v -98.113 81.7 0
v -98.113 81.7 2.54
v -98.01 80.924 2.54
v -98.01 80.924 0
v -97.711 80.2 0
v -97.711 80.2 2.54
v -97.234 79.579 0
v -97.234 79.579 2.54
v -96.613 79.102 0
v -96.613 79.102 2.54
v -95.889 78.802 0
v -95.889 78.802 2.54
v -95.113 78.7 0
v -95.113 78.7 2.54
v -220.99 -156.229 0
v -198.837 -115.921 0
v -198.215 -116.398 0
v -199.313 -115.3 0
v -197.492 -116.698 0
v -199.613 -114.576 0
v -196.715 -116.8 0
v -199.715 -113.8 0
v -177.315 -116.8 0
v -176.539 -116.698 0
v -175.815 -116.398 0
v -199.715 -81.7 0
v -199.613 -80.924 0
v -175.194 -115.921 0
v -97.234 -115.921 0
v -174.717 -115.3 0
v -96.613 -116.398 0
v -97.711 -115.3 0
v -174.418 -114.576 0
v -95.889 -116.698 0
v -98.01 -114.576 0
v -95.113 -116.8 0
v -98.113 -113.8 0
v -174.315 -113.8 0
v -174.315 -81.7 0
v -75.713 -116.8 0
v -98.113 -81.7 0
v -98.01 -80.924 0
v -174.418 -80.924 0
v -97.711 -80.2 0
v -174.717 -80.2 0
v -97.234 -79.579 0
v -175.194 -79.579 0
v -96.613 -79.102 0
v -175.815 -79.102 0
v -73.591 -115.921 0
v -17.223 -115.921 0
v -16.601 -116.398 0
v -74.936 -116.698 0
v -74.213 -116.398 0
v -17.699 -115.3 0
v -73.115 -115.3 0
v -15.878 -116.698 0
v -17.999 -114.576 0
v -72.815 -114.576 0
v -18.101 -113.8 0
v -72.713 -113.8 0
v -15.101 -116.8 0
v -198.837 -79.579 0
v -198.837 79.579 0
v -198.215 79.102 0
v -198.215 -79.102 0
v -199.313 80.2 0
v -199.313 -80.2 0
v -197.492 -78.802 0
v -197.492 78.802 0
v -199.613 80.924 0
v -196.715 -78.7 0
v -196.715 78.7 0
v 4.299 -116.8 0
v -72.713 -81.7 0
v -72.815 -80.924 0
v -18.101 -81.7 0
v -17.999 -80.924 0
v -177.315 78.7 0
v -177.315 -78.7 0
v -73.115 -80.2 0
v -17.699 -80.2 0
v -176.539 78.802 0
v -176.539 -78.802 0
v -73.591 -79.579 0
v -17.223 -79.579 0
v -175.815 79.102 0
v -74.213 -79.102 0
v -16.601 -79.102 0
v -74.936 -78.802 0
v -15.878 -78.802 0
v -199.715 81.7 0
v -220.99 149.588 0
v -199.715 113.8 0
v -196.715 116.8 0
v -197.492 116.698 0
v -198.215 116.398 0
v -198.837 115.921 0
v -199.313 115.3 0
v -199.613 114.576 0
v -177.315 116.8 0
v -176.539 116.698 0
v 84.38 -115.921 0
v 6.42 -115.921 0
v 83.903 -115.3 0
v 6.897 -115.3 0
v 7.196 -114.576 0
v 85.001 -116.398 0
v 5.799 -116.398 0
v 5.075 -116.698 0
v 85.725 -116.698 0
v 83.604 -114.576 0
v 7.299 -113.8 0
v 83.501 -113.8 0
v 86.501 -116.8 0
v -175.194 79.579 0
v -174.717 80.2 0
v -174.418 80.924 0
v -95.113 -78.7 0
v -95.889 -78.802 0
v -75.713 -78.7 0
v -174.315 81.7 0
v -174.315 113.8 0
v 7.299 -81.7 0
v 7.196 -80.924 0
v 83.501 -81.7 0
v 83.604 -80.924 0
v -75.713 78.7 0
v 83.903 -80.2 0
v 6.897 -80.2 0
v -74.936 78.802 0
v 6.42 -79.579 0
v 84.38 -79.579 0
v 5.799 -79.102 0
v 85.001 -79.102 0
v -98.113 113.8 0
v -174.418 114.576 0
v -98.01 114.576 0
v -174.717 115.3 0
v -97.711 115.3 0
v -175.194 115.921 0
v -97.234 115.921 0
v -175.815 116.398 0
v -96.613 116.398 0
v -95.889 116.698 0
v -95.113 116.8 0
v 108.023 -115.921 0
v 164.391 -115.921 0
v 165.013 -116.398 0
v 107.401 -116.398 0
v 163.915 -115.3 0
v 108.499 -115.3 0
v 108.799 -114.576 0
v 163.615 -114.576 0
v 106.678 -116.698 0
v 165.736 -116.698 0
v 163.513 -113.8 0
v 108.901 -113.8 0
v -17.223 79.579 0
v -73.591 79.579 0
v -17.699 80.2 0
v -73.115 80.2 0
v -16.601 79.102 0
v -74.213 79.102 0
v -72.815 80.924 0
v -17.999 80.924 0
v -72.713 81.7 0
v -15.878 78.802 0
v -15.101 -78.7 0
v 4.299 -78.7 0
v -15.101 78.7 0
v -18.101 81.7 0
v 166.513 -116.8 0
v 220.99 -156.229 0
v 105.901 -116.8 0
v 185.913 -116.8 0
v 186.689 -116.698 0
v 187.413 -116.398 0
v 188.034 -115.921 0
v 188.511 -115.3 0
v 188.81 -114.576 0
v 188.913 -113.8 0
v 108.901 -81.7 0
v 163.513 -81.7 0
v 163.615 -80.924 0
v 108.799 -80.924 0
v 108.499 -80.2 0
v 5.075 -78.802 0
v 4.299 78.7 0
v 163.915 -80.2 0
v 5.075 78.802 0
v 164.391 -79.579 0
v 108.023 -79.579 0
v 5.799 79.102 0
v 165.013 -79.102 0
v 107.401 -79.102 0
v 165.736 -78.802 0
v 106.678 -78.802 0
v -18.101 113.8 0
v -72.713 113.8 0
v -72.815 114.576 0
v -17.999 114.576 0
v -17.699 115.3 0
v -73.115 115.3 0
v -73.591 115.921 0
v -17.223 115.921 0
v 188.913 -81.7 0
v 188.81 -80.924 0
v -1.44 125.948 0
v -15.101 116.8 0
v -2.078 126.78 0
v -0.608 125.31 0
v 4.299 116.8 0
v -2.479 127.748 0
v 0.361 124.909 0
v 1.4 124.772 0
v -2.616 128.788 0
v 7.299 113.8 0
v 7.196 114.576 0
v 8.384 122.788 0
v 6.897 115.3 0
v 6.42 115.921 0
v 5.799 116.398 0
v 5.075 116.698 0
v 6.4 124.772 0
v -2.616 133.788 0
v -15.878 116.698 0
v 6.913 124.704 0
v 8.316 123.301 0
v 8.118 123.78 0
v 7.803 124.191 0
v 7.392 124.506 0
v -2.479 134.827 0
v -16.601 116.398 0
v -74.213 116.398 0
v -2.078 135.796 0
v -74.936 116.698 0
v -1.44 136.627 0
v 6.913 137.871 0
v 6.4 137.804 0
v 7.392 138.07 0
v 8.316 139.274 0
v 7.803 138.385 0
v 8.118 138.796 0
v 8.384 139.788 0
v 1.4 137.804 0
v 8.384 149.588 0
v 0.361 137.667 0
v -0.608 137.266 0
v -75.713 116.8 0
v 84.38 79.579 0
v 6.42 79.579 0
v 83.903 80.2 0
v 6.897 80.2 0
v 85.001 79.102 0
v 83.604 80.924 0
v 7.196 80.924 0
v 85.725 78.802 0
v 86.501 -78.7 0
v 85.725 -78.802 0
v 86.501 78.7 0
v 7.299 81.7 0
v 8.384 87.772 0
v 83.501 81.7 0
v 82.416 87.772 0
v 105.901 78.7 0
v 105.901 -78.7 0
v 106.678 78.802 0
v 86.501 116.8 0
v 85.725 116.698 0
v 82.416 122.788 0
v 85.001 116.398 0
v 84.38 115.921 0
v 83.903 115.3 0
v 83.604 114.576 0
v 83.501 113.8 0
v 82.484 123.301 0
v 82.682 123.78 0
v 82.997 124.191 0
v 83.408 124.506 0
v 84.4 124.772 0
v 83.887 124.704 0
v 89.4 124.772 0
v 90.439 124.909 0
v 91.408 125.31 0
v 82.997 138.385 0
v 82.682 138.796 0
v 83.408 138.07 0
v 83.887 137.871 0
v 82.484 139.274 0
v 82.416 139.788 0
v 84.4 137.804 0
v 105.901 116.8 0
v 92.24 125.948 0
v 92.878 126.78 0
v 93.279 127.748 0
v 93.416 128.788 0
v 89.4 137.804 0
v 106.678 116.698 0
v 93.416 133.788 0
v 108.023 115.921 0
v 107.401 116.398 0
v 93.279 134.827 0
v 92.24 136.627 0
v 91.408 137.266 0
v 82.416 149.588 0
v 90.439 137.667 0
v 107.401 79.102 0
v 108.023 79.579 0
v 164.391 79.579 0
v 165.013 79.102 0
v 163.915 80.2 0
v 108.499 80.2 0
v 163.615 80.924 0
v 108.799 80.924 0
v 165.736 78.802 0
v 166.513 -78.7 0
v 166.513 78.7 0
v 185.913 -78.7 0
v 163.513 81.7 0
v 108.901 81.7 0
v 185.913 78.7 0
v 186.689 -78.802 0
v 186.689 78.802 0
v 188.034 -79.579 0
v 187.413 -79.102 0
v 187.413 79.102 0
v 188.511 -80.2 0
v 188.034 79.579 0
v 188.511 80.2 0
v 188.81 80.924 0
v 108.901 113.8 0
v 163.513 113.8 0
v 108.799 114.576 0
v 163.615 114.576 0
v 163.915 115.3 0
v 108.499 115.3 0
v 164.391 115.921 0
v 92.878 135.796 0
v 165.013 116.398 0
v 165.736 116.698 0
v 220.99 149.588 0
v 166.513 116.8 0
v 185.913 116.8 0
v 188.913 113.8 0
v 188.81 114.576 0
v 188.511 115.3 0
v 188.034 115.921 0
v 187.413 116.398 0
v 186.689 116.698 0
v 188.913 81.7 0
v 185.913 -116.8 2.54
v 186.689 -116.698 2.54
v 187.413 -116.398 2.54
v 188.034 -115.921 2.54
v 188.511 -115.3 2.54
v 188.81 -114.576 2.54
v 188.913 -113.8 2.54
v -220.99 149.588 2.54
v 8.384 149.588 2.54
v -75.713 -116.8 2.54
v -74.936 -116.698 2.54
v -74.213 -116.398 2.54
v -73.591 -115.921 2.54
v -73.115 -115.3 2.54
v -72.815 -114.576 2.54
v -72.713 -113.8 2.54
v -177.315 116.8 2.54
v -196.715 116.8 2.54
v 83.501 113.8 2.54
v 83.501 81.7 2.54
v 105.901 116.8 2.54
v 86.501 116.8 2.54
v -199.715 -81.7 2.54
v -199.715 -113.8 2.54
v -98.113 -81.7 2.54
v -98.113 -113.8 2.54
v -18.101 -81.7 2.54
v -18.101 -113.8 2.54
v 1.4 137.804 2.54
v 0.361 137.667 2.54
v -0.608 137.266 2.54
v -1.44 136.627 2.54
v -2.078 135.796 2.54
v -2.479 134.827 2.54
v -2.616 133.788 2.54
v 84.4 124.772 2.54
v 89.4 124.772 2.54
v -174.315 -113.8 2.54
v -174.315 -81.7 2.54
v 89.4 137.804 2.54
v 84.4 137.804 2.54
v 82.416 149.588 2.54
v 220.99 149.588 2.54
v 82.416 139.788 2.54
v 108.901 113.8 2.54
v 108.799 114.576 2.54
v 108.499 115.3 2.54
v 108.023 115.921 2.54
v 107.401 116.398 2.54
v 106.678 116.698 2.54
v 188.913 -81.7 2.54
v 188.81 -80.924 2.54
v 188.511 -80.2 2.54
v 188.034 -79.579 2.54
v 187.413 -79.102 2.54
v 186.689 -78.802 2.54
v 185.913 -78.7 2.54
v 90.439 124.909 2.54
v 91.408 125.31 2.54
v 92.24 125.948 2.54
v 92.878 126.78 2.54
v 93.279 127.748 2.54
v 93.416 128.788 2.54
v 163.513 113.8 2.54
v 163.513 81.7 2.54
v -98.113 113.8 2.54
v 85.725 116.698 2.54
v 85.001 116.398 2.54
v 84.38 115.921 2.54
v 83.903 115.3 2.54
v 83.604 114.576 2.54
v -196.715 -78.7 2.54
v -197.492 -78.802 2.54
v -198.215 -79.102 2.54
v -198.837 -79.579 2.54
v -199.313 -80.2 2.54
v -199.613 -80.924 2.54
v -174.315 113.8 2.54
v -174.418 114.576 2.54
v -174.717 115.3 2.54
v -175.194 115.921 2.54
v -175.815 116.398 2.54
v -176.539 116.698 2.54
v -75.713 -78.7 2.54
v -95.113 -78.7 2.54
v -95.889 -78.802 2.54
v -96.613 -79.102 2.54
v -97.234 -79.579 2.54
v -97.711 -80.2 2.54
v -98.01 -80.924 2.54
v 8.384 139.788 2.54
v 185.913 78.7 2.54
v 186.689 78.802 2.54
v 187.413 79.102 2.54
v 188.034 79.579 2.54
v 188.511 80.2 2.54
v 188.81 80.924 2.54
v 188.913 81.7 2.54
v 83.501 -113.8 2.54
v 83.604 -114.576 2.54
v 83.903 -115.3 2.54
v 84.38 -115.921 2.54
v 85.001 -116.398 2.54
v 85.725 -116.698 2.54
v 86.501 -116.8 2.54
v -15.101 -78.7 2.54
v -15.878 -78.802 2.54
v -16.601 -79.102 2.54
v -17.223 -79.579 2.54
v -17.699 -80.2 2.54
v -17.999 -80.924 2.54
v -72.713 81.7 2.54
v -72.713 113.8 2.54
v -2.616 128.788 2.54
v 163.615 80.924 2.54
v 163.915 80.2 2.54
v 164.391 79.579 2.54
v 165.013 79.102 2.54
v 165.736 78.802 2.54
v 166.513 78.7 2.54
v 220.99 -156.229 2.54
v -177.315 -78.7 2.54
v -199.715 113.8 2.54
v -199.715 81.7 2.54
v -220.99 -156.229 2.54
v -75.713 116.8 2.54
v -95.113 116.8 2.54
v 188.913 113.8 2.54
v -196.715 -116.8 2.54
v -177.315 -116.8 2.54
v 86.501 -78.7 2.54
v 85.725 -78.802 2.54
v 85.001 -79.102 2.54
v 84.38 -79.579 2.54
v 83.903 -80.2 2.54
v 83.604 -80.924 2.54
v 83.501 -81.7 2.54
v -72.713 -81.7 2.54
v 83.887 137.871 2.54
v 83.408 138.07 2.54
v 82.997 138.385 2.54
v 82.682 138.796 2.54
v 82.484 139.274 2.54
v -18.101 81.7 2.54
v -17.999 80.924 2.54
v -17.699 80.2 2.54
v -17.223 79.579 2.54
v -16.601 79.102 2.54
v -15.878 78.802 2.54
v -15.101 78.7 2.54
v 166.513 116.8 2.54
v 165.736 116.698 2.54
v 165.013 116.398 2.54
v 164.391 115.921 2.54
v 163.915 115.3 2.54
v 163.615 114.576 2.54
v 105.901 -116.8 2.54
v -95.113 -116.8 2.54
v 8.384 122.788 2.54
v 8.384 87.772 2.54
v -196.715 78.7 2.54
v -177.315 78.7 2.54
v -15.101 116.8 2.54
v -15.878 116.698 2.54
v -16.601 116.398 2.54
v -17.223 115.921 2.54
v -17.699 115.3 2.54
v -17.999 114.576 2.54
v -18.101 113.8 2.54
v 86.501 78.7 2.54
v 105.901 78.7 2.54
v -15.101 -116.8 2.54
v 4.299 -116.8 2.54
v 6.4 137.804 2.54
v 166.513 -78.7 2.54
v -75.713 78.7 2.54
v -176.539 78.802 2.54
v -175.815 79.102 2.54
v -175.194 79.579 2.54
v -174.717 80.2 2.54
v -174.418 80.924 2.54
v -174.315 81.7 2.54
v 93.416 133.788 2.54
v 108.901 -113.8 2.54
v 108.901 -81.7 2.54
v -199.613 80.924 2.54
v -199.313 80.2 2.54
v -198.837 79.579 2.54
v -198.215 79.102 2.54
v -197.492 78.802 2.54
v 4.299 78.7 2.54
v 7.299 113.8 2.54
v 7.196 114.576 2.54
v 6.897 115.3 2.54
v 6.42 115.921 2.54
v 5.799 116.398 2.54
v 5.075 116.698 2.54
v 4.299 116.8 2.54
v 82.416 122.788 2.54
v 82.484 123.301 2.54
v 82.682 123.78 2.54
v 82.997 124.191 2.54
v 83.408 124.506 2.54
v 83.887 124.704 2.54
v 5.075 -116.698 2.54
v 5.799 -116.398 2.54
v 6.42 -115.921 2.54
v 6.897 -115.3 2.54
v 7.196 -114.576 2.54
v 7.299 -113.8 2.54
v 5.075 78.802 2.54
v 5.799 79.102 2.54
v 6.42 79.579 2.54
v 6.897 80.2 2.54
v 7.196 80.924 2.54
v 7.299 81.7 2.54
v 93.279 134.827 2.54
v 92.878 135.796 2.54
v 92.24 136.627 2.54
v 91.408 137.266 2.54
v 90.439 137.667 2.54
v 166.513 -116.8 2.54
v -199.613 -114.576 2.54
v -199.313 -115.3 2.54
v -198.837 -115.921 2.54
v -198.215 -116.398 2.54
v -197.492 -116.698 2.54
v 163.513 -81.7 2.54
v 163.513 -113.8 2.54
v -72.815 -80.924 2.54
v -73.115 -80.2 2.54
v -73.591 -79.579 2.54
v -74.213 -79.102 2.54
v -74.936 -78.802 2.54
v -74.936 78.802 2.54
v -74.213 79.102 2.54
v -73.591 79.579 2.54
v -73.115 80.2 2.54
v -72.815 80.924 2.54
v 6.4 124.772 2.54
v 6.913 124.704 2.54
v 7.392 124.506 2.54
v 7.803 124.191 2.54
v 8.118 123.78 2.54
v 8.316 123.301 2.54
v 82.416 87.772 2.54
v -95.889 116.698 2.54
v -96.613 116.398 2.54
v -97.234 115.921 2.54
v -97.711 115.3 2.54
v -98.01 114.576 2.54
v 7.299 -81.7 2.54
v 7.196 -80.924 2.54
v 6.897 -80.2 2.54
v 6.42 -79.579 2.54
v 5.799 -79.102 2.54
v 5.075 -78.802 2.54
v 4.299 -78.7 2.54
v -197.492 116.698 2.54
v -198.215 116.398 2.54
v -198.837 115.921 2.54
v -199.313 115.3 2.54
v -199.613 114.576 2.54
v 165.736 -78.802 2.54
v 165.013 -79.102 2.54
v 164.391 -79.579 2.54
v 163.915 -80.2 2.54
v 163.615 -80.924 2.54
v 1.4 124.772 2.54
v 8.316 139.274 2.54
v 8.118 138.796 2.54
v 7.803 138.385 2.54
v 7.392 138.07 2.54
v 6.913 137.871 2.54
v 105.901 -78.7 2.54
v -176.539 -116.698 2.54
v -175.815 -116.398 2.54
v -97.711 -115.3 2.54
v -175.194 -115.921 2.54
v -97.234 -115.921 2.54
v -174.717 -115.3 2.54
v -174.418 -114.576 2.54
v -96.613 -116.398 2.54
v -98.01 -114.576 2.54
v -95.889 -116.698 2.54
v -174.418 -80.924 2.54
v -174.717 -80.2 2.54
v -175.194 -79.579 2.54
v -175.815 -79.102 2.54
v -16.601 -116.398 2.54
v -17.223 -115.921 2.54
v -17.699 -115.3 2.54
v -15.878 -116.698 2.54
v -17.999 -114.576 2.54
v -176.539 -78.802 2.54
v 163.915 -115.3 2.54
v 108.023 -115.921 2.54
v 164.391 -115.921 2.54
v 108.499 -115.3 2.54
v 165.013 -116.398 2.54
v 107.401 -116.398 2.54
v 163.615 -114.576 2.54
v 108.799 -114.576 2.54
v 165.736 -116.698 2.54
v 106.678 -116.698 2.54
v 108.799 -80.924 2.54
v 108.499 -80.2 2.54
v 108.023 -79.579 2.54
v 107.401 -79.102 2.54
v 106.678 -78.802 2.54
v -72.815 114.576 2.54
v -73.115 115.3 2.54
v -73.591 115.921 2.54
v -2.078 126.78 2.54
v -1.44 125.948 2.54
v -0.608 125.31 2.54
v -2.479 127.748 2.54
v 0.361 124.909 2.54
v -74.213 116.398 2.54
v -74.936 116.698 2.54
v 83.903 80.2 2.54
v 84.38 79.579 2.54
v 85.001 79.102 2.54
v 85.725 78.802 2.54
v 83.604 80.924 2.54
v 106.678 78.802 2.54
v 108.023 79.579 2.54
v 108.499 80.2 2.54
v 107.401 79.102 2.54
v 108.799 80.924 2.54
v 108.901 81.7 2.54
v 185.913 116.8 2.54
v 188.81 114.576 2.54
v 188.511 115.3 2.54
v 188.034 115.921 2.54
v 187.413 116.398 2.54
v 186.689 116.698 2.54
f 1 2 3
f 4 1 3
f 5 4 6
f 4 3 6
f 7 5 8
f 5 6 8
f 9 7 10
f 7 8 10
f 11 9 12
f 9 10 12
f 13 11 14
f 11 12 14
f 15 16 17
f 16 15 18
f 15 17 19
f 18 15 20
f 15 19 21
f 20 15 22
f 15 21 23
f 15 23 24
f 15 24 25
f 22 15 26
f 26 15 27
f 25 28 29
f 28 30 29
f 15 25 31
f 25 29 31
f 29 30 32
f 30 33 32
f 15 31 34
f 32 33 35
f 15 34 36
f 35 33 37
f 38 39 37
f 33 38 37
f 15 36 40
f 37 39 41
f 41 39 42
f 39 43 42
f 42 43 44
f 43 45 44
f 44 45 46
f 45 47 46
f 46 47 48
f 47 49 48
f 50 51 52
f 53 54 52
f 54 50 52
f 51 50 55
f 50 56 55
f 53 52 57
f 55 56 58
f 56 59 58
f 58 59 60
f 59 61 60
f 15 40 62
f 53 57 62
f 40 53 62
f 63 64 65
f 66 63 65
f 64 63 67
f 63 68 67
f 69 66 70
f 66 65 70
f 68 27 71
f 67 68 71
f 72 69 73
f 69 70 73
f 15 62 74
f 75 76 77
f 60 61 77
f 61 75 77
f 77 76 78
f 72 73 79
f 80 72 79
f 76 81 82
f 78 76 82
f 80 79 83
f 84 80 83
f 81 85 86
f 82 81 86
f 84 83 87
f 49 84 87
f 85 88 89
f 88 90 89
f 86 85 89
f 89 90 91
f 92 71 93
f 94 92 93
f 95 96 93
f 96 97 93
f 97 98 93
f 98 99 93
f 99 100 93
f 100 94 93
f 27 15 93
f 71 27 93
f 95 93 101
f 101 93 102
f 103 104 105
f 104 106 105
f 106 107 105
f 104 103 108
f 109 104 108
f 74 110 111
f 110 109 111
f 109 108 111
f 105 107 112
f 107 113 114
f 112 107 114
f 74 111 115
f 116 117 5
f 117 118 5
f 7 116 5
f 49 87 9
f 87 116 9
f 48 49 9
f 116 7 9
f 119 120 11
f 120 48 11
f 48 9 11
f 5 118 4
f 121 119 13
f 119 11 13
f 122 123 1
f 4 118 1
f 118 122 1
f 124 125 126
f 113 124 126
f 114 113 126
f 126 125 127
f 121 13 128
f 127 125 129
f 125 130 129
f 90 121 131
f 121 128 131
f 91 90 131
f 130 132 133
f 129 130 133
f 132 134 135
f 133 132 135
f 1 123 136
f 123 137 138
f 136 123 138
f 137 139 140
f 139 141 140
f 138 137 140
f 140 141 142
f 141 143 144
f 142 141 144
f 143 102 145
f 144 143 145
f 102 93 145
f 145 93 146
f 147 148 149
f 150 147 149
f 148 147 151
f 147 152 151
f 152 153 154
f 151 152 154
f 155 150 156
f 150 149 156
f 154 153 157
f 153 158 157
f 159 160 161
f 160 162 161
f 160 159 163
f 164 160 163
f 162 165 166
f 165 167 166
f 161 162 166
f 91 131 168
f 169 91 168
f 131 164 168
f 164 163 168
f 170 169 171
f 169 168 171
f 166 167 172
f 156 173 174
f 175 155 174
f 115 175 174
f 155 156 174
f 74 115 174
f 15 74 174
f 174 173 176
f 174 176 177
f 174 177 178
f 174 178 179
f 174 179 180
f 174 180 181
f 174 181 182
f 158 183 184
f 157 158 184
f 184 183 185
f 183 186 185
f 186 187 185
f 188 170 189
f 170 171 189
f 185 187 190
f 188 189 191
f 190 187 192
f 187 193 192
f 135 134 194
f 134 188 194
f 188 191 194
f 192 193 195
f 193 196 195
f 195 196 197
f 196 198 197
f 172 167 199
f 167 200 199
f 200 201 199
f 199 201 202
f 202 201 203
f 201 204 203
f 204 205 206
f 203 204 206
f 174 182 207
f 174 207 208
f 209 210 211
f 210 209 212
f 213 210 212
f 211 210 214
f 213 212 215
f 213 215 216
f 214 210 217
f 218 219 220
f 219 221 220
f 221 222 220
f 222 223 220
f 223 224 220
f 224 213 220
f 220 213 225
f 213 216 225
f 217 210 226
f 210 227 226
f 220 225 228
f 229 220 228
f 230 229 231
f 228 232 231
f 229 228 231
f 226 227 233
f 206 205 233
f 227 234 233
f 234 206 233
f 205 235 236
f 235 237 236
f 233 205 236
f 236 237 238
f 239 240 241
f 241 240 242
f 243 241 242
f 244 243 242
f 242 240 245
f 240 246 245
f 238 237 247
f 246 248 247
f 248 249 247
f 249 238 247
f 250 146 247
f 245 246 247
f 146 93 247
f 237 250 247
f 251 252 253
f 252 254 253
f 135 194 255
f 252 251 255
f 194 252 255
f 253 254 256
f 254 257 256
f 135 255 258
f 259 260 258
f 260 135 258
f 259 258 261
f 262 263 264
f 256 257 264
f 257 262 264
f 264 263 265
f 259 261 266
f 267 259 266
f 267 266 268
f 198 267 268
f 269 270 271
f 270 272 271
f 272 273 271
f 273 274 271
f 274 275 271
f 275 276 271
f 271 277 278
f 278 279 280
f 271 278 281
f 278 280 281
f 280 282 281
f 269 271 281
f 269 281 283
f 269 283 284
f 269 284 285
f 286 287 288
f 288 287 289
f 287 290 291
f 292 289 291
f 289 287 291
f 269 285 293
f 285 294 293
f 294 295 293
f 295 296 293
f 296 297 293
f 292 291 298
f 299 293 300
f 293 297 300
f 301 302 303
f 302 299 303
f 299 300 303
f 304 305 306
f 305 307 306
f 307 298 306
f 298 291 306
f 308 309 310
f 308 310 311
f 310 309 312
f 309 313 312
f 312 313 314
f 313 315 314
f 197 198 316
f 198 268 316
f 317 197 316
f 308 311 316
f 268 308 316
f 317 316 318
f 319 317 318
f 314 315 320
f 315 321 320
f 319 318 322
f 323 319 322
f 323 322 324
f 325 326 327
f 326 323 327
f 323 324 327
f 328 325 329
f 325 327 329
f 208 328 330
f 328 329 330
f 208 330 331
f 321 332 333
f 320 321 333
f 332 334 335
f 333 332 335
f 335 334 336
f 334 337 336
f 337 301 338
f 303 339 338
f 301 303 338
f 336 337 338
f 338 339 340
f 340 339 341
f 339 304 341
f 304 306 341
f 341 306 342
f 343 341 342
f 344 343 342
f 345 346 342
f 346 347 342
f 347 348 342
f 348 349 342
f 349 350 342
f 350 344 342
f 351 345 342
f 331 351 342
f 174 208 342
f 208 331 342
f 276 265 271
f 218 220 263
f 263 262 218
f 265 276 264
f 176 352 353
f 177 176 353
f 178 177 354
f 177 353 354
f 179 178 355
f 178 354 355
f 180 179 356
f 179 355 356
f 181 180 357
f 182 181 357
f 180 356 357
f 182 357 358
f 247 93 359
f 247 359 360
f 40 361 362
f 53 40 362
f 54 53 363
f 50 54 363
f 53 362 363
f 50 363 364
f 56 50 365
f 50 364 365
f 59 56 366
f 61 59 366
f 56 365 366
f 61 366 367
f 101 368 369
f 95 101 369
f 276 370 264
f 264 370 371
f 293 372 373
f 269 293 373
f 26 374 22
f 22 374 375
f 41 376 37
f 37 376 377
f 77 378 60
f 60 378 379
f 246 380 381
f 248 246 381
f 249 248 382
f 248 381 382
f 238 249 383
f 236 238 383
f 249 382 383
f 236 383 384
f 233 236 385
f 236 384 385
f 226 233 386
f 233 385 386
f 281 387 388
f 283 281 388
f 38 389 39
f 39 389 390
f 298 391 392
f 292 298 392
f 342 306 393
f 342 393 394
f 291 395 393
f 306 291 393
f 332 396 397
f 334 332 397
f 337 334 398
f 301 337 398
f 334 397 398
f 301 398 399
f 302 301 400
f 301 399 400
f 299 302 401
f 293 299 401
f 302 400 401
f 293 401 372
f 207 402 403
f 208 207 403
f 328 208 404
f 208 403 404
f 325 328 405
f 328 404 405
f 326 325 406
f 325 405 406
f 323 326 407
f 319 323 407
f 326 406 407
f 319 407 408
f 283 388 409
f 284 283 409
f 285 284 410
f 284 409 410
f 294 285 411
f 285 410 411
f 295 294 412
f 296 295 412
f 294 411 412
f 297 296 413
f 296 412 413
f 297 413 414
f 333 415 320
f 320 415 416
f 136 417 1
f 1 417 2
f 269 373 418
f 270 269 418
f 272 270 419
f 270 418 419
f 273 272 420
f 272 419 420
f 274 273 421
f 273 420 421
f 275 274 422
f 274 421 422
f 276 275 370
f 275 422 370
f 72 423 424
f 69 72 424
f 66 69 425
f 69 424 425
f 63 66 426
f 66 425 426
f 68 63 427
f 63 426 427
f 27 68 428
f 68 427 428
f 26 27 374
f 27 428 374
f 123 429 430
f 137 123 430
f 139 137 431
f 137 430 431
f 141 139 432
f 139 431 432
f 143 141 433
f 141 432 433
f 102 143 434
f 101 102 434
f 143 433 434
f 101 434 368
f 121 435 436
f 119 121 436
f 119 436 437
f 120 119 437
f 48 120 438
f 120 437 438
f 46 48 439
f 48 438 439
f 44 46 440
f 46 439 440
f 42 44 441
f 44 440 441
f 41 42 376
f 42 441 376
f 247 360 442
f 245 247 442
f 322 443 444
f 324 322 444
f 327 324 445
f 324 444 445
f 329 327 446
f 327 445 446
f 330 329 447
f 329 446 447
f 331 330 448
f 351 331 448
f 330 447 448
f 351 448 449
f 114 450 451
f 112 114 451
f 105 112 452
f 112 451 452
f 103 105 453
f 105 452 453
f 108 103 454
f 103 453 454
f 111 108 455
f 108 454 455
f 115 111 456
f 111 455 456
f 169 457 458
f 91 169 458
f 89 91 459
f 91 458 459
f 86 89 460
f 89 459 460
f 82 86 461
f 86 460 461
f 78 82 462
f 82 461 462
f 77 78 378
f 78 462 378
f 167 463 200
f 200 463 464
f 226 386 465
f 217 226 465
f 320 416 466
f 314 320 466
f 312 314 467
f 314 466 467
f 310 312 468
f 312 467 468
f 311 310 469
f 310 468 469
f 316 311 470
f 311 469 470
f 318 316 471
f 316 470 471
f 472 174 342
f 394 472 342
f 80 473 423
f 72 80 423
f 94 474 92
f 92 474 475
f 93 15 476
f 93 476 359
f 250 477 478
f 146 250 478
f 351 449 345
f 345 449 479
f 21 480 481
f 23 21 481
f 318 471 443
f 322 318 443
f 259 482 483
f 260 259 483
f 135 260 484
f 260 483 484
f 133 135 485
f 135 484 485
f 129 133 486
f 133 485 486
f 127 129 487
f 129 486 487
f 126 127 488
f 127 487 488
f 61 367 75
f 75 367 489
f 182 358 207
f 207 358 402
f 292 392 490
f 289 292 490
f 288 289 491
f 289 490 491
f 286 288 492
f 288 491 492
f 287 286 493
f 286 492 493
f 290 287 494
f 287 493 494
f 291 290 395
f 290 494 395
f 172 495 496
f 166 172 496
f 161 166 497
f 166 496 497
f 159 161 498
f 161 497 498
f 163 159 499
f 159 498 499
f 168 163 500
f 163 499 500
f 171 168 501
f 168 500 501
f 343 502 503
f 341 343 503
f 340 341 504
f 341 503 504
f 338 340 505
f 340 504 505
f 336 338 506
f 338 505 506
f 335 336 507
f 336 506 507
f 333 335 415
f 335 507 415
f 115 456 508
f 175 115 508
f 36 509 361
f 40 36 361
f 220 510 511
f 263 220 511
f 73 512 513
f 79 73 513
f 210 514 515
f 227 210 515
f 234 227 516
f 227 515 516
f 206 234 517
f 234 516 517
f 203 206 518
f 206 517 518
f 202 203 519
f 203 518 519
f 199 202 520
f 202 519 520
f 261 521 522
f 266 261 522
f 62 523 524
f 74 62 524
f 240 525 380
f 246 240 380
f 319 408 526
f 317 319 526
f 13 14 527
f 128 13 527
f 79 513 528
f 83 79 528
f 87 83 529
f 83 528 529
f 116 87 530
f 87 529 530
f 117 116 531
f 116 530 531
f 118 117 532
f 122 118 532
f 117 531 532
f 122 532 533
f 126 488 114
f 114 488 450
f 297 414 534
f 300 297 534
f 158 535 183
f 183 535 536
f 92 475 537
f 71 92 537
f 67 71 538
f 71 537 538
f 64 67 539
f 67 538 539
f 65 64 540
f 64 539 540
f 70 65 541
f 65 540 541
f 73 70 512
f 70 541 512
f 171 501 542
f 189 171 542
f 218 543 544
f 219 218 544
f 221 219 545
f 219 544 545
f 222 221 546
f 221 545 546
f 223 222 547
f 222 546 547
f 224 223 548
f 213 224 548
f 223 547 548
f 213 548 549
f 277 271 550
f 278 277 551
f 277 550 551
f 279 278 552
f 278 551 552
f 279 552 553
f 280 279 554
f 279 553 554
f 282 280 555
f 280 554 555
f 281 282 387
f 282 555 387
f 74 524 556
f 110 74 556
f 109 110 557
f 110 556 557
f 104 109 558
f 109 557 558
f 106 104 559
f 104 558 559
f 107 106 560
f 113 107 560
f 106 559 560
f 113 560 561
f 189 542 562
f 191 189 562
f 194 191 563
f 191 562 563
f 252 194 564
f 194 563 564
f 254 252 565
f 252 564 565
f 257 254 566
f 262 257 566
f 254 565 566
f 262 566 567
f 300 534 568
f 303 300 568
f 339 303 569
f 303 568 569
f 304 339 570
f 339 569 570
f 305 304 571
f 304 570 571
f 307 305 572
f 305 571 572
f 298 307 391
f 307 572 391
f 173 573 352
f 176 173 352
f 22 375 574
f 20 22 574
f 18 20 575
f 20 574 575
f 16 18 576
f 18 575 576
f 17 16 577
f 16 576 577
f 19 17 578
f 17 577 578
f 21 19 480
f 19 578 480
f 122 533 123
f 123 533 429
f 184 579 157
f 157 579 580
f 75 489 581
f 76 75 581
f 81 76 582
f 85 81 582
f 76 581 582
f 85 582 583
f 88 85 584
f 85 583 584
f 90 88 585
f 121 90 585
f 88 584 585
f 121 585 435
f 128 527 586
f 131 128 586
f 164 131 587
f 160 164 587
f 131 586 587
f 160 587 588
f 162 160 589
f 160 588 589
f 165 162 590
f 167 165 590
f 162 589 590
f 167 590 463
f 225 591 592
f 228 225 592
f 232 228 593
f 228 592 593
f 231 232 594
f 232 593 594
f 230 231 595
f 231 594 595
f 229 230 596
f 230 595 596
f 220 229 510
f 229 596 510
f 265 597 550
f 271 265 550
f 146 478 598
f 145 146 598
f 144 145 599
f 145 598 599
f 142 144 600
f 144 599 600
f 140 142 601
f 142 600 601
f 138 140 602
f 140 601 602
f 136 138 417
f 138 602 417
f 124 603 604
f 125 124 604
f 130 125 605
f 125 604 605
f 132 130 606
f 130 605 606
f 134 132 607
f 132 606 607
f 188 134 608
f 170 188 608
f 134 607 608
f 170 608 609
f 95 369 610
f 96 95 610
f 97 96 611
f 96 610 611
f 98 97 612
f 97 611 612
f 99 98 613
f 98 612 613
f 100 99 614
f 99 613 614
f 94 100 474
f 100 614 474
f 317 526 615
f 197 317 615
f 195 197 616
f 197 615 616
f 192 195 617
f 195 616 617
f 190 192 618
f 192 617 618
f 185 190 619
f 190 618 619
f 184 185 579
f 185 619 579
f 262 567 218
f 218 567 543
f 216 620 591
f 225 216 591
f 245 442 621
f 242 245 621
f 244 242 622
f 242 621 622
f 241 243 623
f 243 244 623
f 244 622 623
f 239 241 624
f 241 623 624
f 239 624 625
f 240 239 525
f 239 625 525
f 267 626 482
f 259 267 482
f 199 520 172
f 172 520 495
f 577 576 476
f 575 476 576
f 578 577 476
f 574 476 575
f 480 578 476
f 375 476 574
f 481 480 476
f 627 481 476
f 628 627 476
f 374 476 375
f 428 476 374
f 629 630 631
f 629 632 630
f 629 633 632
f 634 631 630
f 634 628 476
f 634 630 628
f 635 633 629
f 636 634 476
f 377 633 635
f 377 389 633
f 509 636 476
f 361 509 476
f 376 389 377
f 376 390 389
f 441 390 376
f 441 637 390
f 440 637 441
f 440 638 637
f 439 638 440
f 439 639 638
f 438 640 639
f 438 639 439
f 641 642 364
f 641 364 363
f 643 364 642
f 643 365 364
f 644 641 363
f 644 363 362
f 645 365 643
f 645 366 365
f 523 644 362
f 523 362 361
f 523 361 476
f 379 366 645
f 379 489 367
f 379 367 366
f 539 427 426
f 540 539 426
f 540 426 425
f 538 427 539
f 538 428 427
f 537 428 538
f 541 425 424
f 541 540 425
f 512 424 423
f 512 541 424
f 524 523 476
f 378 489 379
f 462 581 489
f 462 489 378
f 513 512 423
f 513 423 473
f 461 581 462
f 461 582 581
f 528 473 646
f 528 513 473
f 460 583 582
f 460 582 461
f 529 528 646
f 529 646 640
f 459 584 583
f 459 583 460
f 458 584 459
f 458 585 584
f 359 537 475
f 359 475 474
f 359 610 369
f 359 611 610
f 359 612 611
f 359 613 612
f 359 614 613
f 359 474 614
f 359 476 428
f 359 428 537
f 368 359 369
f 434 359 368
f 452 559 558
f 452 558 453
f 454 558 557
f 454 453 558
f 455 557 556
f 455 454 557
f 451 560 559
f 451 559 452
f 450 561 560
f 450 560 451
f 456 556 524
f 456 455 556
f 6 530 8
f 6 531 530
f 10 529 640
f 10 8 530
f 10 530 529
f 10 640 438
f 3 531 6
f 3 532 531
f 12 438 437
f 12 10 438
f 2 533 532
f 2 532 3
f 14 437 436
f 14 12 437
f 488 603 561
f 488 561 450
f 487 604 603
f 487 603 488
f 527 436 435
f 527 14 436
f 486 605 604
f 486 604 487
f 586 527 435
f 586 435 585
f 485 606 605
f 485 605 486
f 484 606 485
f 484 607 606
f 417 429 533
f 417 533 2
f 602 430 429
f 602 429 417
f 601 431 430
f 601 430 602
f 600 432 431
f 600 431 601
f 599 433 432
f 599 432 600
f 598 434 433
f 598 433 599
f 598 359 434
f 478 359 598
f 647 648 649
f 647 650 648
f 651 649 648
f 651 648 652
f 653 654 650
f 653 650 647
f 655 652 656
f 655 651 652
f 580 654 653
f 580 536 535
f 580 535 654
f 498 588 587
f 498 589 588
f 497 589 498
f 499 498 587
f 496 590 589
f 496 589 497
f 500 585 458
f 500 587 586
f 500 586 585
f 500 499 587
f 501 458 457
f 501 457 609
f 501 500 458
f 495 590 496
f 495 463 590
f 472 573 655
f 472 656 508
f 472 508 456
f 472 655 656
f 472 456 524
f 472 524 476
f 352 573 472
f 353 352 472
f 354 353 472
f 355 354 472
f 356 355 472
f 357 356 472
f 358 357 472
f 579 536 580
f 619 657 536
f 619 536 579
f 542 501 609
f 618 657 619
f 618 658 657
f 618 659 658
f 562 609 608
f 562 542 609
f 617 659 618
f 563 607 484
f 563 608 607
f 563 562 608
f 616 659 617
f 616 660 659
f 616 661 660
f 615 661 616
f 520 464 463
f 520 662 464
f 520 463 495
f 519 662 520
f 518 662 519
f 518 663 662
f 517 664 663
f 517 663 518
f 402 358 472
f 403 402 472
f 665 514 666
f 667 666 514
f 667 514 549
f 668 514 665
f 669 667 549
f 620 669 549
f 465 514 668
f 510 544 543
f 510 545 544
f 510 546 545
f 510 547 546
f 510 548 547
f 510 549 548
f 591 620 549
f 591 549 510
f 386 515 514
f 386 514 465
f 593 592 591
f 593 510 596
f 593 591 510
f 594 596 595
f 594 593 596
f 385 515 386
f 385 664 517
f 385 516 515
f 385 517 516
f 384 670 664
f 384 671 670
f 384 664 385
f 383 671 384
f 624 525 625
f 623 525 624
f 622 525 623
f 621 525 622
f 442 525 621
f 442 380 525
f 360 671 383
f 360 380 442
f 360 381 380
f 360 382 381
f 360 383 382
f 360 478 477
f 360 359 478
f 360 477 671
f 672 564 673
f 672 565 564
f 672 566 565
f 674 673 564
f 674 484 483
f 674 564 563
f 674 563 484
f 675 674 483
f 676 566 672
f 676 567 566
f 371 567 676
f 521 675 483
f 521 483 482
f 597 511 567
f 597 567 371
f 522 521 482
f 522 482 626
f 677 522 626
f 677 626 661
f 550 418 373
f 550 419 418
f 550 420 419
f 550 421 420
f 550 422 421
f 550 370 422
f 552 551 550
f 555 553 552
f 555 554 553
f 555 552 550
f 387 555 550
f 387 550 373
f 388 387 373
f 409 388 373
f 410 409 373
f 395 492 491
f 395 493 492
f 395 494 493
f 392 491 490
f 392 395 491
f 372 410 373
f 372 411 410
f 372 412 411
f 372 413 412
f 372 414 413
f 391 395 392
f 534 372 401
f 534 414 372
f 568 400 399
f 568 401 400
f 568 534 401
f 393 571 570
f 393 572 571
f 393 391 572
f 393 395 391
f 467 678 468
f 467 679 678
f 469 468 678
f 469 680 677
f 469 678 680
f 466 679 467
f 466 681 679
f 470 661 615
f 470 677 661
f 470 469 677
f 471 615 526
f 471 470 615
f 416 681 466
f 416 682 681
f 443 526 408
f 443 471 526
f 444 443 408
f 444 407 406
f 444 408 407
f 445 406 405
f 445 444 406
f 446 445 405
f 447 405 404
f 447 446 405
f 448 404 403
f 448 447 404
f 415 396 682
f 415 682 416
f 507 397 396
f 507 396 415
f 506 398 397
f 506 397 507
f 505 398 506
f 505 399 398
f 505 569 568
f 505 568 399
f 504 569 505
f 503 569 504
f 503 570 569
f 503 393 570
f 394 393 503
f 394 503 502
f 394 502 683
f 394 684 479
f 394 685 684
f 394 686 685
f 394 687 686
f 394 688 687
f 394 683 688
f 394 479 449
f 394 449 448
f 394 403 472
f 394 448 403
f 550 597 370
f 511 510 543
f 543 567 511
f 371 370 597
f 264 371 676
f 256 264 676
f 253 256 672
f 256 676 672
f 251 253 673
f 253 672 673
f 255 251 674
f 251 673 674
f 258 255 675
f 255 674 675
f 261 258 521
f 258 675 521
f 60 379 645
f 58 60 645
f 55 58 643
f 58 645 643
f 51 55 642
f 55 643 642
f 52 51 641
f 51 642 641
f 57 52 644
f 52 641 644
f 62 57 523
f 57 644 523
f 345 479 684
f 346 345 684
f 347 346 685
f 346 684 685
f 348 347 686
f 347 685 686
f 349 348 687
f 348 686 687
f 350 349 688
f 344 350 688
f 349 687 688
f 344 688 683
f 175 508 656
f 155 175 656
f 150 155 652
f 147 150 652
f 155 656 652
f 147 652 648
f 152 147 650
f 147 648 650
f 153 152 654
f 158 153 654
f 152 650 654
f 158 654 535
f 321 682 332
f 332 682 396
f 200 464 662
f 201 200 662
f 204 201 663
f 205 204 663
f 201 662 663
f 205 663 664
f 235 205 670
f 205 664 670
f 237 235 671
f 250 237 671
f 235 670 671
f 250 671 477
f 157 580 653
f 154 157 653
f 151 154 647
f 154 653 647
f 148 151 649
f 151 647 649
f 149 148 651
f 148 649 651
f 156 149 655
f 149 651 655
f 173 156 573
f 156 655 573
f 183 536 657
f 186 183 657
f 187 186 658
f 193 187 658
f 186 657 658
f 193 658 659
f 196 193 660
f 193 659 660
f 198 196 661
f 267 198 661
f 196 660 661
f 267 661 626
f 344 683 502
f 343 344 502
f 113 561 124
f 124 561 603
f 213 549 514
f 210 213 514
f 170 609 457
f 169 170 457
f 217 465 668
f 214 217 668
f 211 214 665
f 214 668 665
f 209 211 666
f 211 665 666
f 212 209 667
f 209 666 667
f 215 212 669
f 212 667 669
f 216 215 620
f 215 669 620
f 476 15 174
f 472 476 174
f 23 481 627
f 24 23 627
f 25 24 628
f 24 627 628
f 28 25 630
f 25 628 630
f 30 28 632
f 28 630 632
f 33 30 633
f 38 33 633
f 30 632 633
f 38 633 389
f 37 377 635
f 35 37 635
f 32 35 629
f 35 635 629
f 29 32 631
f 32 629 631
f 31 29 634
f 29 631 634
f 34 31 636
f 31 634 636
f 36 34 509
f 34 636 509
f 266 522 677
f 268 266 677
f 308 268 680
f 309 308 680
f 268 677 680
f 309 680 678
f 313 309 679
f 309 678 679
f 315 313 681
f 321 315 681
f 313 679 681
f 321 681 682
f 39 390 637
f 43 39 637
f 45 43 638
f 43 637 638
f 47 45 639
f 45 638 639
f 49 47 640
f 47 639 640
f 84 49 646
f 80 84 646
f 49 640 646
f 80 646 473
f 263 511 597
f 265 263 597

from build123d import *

# Parameters (mm, degrees)
SKETCH1_W           = 441.979400076
SKETCH1_H           = 305.81676
BOSS_EXTRUDE1_DEPTH = 2.54
CUT_EXTRUDE1_DEPTH  = 271.648139079
LPATTERN1_COUNT     = 3
LPATTERN1_PITCH     = 181.613999992
CUT_EXTRUDE2_DEPTH  = 271.648139079
LPATTERN2_COUNT     = 2
LPATTERN2_PITCH     = 181.613999992
CUT_EXTRUDE3_DEPTH  = 271.648139079


with BuildPart() as part:
    # Sketch1 → Boss-Extrude1 (new body)
    # profile 1 of 5: a face of its own
    with BuildSketch(Plane.XY):
        with Locations((0, -3.32067)):
            Rectangle(SKETCH1_W, SKETCH1_H)
        with BuildLine():
            ThreePointArc((-98.112625, -113.8), (-97.233945344, -115.921320344), (-95.112625, -116.8))
            Line((-95.112625, -116.8), (-75.712625, -116.8))
            ThreePointArc((-75.712625, -116.8), (-73.591304656, -115.921320344), (-72.712625, -113.8))
            Line((-72.712625, -113.8), (-72.712625, -81.7))
            ThreePointArc((-72.712625, -81.7), (-73.591304656, -79.578679656), (-75.712625, -78.7))
            Line((-75.712625, -78.7), (-95.112625, -78.7))
            ThreePointArc((-95.112625, -78.7), (-97.233945344, -79.578679656), (-98.112625, -81.7))
            Line((-98.112625, -81.7), (-98.112625, -113.8))
        make_face(mode=Mode.SUBTRACT)
        with BuildLine():
            ThreePointArc((-98.112625, 81.7), (-97.233945344, 79.578679656), (-95.112625, 78.7))
            Line((-95.112625, 78.7), (-75.712625, 78.7))
            ThreePointArc((-75.712625, 78.7), (-73.591304656, 79.578679656), (-72.712625, 81.7))
            Line((-72.712625, 81.7), (-72.712625, 113.8))
            ThreePointArc((-72.712625, 113.8), (-73.591304656, 115.921320344), (-75.712625, 116.8))
            Line((-75.712625, 116.8), (-95.112625, 116.8))
            ThreePointArc((-95.112625, 116.8), (-97.233945344, 115.921320344), (-98.112625, 113.8))
            Line((-98.112625, 113.8), (-98.112625, 81.7))
        make_face(mode=Mode.SUBTRACT)
        with BuildLine():
            ThreePointArc((-199.715375, -113.8), (-198.836695344, -115.921320344), (-196.715375, -116.8))
            Line((-196.715375, -116.8), (-177.315375, -116.8))
            ThreePointArc((-177.315375, -116.8), (-175.194054656, -115.921320344), (-174.315375, -113.8))
            Line((-174.315375, -113.8), (-174.315375, -81.7))
            ThreePointArc((-174.315375, -81.7), (-175.194054656, -79.578679656), (-177.315375, -78.7))
            Line((-177.315375, -78.7), (-196.715375, -78.7))
            ThreePointArc((-196.715375, -78.7), (-198.836695344, -79.578679656), (-199.715375, -81.7))
            Line((-199.715375, -81.7), (-199.715375, -113.8))
        make_face(mode=Mode.SUBTRACT)
        with BuildLine():
            ThreePointArc((-199.715375, 81.7), (-198.836695344, 79.578679656), (-196.715375, 78.7))
            Line((-196.715375, 78.7), (-177.315375, 78.7))
            ThreePointArc((-177.315375, 78.7), (-175.194054656, 79.578679656), (-174.315375, 81.7))
            Line((-174.315375, 81.7), (-174.315375, 113.8))
            ThreePointArc((-174.315375, 113.8), (-175.194054656, 115.921320344), (-177.315375, 116.8))
            Line((-177.315375, 116.8), (-196.715375, 116.8))
            ThreePointArc((-196.715375, 116.8), (-198.836695344, 115.921320344), (-199.715375, 113.8))
            Line((-199.715375, 113.8), (-199.715375, 81.7))
        make_face(mode=Mode.SUBTRACT)
    # profile 2 of 5: a face of its own
    with BuildSketch(Plane.XY):
        with BuildLine():
            Line((-199.715375, -113.8), (-199.715375, -81.7))
            ThreePointArc((-199.715375, -81.7), (-198.836695344, -79.578679656), (-196.715375, -78.7))
            Line((-196.715375, -78.7), (-177.315375, -78.7))
            ThreePointArc((-177.315375, -78.7), (-175.194054656, -79.578679656), (-174.315375, -81.7))
            Line((-174.315375, -81.7), (-174.315375, -113.8))
            ThreePointArc((-174.315375, -113.8), (-175.194054656, -115.921320344), (-177.315375, -116.8))
            Line((-177.315375, -116.8), (-196.715375, -116.8))
            ThreePointArc((-196.715375, -116.8), (-198.836695344, -115.921320344), (-199.715375, -113.8))
        make_face()
    # profile 3 of 5: a face of its own
    with BuildSketch(Plane.XY):
        with BuildLine():
            Line((-98.112625, -113.8), (-98.112625, -81.7))
            ThreePointArc((-98.112625, -81.7), (-97.233945344, -79.578679656), (-95.112625, -78.7))
            Line((-95.112625, -78.7), (-75.712625, -78.7))
            ThreePointArc((-75.712625, -78.7), (-73.591304656, -79.578679656), (-72.712625, -81.7))
            Line((-72.712625, -81.7), (-72.712625, -113.8))
            ThreePointArc((-72.712625, -113.8), (-73.591304656, -115.921320344), (-75.712625, -116.8))
            Line((-75.712625, -116.8), (-95.112625, -116.8))
            ThreePointArc((-95.112625, -116.8), (-97.233945344, -115.921320344), (-98.112625, -113.8))
        make_face()
    # profile 4 of 5: a face of its own
    with BuildSketch(Plane.XY):
        with BuildLine():
            Line((-199.715375, 113.8), (-199.715375, 81.7))
            ThreePointArc((-199.715375, 81.7), (-198.836695344, 79.578679656), (-196.715375, 78.7))
            Line((-196.715375, 78.7), (-177.315375, 78.7))
            ThreePointArc((-177.315375, 78.7), (-175.194054656, 79.578679656), (-174.315375, 81.7))
            Line((-174.315375, 81.7), (-174.315375, 113.8))
            ThreePointArc((-174.315375, 113.8), (-175.194054656, 115.921320344), (-177.315375, 116.8))
            Line((-177.315375, 116.8), (-196.715375, 116.8))
            ThreePointArc((-196.715375, 116.8), (-198.836695344, 115.921320344), (-199.715375, 113.8))
        make_face()
    # profile 5 of 5: a face of its own
    with BuildSketch(Plane.XY):
        with BuildLine():
            Line((-98.112625, 113.8), (-98.112625, 81.7))
            ThreePointArc((-98.112625, 81.7), (-97.233945344, 79.578679656), (-95.112625, 78.7))
            Line((-95.112625, 78.7), (-75.712625, 78.7))
            ThreePointArc((-75.712625, 78.7), (-73.591304656, 79.578679656), (-72.712625, 81.7))
            Line((-72.712625, 81.7), (-72.712625, 113.8))
            ThreePointArc((-72.712625, 113.8), (-73.591304656, 115.921320344), (-75.712625, 116.8))
            Line((-75.712625, 116.8), (-95.112625, 116.8))
            ThreePointArc((-95.112625, 116.8), (-97.233945344, 115.921320344), (-98.112625, 113.8))
        make_face()
    extrude(amount=BOSS_EXTRUDE1_DEPTH)

    # Sketch2 → Cut-Extrude1 (cut, through all)
    with BuildSketch(Plane.XY.offset(2.54)):
        with BuildLine():
            Line((-196.715375, 78.7), (-177.315375, 78.7))
            ThreePointArc((-177.315375, 78.7), (-175.194054656, 79.578679656), (-174.315375, 81.7))
            Line((-174.315375, 81.7), (-174.315375, 113.8))
            ThreePointArc((-174.315375, 113.8), (-175.194054656, 115.921320344), (-177.315375, 116.8))
            Line((-177.315375, 116.8), (-196.715375, 116.8))
            ThreePointArc((-196.715375, 116.8), (-198.836695344, 115.921320344), (-199.715375, 113.8))
            Line((-199.715375, 113.8), (-199.715375, 81.7))
            ThreePointArc((-199.715375, 81.7), (-198.836695344, 79.578679656), (-196.715375, 78.7))
        make_face()
        with BuildLine():
            Line((-199.715375, -81.7), (-199.715375, -113.8))
            ThreePointArc((-199.715375, -113.8), (-198.836695344, -115.921320344), (-196.715375, -116.8))
            Line((-196.715375, -116.8), (-177.315375, -116.8))
            ThreePointArc((-177.315375, -116.8), (-175.194054656, -115.921320344), (-174.315375, -113.8))
            Line((-174.315375, -113.8), (-174.315375, -81.7))
            ThreePointArc((-174.315375, -81.7), (-175.194054656, -79.578679656), (-177.315375, -78.7))
            Line((-177.315375, -78.7), (-196.715375, -78.7))
            ThreePointArc((-196.715375, -78.7), (-198.836695344, -79.578679656), (-199.715375, -81.7))
        make_face()
    cut_extrude1 = extrude(amount=-CUT_EXTRUDE1_DEPTH, mode=Mode.SUBTRACT)

    # LPattern1: Cut-Extrude1 ×3
    with Locations(*[(i * LPATTERN1_PITCH, 0, 0) for i in range(1, LPATTERN1_COUNT)]):
        add(cut_extrude1, mode=Mode.SUBTRACT)

    # Sketch3 → Cut-Extrude2 (cut, through all)
    with BuildSketch(Plane.XY.offset(2.54)):
        with BuildLine():
            Line((-72.712625, 81.7), (-72.712625, 113.8))
            ThreePointArc((-72.712625, 113.8), (-73.591304656, 115.921320344), (-75.712625, 116.8))
            Line((-75.712625, 116.8), (-95.112625, 116.8))
            ThreePointArc((-95.112625, 116.8), (-97.233945344, 115.921320344), (-98.112625, 113.8))
            Line((-98.112625, 113.8), (-98.112625, 81.7))
            ThreePointArc((-98.112625, 81.7), (-97.233945344, 79.578679656), (-95.112625, 78.7))
            Line((-95.112625, 78.7), (-75.712625, 78.7))
            ThreePointArc((-75.712625, 78.7), (-73.591304656, 79.578679656), (-72.712625, 81.7))
        make_face()
        with BuildLine():
            Line((-72.712625, -113.8), (-72.712625, -81.7))
            ThreePointArc((-72.712625, -81.7), (-73.591304656, -79.578679656), (-75.712625, -78.7))
            Line((-75.712625, -78.7), (-95.112625, -78.7))
            ThreePointArc((-95.112625, -78.7), (-97.233945344, -79.578679656), (-98.112625, -81.7))
            Line((-98.112625, -81.7), (-98.112625, -113.8))
            ThreePointArc((-98.112625, -113.8), (-97.233945344, -115.921320344), (-95.112625, -116.8))
            Line((-95.112625, -116.8), (-75.712625, -116.8))
            ThreePointArc((-75.712625, -116.8), (-73.591304656, -115.921320344), (-72.712625, -113.8))
        make_face()
    cut_extrude2 = extrude(amount=-CUT_EXTRUDE2_DEPTH, mode=Mode.SUBTRACT)

    # LPattern2: Cut-Extrude2 ×2
    with Locations(*[(i * LPATTERN2_PITCH, 0, 0) for i in range(1, LPATTERN2_COUNT)]):
        add(cut_extrude2, mode=Mode.SUBTRACT)

    # Sketch5 → Cut-Extrude3 (cut, through all)
    with BuildSketch(Plane.XY.offset(2.54)):
        with BuildLine():
            ThreePointArc((8.383999992, 139.78771), (7.802899846, 138.384810146), (6.399999992, 137.80371))
            Line((6.399999992, 137.80371), (1.399999992, 137.80371))
            ThreePointArc((1.399999992, 137.80371), (-1.439740841, 136.627450833), (-2.616000008, 133.78771))
            Line((-2.616000008, 133.78771), (-2.616000008, 128.78771))
            ThreePointArc((-2.616000008, 128.78771), (-1.439740841, 125.947969167), (1.399999992, 124.77171))
            Line((1.399999992, 124.77171), (6.399999992, 124.77171))
            ThreePointArc((6.399999992, 124.77171), (7.802899846, 124.190609854), (8.383999992, 122.78771))
            Line((8.383999992, 122.78771), (8.383999992, 87.77171))
            Line((8.383999992, 87.77171), (82.415999992, 87.77171))
            Line((82.415999992, 87.77171), (82.415999992, 122.78771))
            ThreePointArc((82.415999992, 122.78771), (82.997100138, 124.190609854), (84.399999992, 124.77171))
            Line((84.399999992, 124.77171), (89.399999992, 124.77171))
            ThreePointArc((89.399999992, 124.77171), (92.239740825, 125.947969167), (93.415999992, 128.78771))
            Line((93.415999992, 128.78771), (93.415999992, 133.78771))
            ThreePointArc((93.415999992, 133.78771), (92.239740825, 136.627450833), (89.399999992, 137.80371))
            Line((89.399999992, 137.80371), (84.399999992, 137.80371))
            ThreePointArc((84.399999992, 137.80371), (82.997100138, 138.384810146), (82.415999992, 139.78771))
            Line((82.415999992, 139.78771), (82.415999992, 149.80371))
            Line((82.415999992, 149.80371), (8.383999992, 149.80371))
            Line((8.383999992, 149.80371), (8.383999992, 139.78771))
        make_face()
    extrude(amount=-CUT_EXTRUDE3_DEPTH, mode=Mode.SUBTRACT)


solid = part.part
